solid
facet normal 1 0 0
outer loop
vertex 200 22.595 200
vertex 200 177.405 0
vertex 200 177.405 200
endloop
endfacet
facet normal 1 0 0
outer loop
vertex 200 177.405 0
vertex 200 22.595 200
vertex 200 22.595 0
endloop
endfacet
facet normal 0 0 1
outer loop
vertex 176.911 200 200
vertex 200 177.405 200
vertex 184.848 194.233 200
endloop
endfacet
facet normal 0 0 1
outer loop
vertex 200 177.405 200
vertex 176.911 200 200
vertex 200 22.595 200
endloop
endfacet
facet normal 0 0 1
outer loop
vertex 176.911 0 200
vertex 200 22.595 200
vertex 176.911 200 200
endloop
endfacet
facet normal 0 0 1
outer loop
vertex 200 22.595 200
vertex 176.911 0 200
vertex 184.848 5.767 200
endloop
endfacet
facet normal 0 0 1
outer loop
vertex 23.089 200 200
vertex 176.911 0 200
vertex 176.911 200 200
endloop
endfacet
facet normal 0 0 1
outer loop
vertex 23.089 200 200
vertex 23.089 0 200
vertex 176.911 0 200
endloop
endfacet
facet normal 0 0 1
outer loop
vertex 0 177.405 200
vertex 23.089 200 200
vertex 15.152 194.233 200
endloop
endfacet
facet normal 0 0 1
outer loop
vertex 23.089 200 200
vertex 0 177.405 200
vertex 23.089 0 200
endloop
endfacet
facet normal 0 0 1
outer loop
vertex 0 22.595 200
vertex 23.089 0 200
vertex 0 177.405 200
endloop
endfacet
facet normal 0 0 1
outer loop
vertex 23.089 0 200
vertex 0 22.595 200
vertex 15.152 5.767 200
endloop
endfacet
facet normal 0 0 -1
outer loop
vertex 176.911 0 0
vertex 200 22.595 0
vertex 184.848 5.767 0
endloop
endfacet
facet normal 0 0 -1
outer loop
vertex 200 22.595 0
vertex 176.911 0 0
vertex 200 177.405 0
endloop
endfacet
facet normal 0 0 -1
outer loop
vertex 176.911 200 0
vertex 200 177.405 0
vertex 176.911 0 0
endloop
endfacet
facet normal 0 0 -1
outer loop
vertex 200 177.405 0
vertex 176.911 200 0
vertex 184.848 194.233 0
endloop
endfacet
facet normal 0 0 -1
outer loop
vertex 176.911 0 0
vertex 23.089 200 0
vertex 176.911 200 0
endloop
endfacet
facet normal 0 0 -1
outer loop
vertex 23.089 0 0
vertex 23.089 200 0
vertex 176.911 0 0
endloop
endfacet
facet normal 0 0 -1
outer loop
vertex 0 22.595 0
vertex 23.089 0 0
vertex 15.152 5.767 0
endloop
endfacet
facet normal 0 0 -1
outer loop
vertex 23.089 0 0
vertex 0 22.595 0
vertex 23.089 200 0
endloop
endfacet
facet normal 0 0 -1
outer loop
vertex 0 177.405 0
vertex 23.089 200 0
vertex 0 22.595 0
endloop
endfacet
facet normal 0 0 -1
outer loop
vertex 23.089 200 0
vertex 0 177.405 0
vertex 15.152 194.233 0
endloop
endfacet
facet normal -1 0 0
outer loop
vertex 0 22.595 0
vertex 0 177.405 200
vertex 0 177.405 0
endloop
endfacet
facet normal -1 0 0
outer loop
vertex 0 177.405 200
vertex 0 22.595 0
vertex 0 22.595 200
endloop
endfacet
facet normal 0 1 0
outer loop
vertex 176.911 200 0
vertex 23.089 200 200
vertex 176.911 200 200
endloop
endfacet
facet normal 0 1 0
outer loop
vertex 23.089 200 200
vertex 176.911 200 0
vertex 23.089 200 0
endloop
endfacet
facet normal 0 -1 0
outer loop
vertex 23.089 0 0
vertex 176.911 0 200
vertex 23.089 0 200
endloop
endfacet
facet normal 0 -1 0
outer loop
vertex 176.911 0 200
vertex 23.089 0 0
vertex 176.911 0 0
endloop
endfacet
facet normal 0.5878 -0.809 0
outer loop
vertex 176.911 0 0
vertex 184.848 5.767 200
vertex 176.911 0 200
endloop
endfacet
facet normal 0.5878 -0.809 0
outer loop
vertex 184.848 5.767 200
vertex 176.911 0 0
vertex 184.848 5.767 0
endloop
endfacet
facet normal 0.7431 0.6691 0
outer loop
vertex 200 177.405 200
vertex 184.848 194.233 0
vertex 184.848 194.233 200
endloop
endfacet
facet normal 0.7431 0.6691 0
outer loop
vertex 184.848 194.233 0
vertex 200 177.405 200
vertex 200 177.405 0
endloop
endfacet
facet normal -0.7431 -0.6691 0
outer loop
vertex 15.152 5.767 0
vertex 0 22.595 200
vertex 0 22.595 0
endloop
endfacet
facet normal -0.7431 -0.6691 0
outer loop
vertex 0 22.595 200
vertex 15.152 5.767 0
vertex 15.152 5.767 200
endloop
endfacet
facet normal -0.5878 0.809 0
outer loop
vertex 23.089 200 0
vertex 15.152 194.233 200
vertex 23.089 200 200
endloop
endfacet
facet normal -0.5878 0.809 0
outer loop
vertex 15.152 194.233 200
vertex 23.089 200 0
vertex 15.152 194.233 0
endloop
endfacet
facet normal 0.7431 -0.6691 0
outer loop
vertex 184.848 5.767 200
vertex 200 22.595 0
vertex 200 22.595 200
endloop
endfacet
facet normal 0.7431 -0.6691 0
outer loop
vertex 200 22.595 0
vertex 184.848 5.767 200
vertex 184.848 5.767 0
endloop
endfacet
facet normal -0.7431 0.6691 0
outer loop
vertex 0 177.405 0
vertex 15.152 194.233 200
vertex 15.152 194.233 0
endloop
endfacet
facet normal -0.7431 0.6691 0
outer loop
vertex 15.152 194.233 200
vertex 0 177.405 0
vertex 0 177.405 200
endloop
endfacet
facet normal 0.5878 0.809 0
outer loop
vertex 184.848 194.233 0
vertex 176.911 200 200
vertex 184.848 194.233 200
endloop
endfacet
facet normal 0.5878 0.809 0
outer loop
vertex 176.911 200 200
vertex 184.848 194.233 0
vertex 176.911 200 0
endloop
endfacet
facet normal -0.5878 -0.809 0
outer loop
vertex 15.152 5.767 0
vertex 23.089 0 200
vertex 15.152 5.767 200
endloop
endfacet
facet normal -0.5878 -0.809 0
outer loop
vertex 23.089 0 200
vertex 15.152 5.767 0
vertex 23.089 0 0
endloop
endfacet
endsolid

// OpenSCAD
// d = lado
module roundcuts_square(d,r,a) {
    intersection() {
        cube([d,d,d]);
        
        translate([d/2,d/2,0])
        cylinder(h=d, r=sqrt(d*d + (d-r)*(d-r))/2 + a);
    }
}
$fs=0.1;
roundcuts_square(200, 100, 15);
